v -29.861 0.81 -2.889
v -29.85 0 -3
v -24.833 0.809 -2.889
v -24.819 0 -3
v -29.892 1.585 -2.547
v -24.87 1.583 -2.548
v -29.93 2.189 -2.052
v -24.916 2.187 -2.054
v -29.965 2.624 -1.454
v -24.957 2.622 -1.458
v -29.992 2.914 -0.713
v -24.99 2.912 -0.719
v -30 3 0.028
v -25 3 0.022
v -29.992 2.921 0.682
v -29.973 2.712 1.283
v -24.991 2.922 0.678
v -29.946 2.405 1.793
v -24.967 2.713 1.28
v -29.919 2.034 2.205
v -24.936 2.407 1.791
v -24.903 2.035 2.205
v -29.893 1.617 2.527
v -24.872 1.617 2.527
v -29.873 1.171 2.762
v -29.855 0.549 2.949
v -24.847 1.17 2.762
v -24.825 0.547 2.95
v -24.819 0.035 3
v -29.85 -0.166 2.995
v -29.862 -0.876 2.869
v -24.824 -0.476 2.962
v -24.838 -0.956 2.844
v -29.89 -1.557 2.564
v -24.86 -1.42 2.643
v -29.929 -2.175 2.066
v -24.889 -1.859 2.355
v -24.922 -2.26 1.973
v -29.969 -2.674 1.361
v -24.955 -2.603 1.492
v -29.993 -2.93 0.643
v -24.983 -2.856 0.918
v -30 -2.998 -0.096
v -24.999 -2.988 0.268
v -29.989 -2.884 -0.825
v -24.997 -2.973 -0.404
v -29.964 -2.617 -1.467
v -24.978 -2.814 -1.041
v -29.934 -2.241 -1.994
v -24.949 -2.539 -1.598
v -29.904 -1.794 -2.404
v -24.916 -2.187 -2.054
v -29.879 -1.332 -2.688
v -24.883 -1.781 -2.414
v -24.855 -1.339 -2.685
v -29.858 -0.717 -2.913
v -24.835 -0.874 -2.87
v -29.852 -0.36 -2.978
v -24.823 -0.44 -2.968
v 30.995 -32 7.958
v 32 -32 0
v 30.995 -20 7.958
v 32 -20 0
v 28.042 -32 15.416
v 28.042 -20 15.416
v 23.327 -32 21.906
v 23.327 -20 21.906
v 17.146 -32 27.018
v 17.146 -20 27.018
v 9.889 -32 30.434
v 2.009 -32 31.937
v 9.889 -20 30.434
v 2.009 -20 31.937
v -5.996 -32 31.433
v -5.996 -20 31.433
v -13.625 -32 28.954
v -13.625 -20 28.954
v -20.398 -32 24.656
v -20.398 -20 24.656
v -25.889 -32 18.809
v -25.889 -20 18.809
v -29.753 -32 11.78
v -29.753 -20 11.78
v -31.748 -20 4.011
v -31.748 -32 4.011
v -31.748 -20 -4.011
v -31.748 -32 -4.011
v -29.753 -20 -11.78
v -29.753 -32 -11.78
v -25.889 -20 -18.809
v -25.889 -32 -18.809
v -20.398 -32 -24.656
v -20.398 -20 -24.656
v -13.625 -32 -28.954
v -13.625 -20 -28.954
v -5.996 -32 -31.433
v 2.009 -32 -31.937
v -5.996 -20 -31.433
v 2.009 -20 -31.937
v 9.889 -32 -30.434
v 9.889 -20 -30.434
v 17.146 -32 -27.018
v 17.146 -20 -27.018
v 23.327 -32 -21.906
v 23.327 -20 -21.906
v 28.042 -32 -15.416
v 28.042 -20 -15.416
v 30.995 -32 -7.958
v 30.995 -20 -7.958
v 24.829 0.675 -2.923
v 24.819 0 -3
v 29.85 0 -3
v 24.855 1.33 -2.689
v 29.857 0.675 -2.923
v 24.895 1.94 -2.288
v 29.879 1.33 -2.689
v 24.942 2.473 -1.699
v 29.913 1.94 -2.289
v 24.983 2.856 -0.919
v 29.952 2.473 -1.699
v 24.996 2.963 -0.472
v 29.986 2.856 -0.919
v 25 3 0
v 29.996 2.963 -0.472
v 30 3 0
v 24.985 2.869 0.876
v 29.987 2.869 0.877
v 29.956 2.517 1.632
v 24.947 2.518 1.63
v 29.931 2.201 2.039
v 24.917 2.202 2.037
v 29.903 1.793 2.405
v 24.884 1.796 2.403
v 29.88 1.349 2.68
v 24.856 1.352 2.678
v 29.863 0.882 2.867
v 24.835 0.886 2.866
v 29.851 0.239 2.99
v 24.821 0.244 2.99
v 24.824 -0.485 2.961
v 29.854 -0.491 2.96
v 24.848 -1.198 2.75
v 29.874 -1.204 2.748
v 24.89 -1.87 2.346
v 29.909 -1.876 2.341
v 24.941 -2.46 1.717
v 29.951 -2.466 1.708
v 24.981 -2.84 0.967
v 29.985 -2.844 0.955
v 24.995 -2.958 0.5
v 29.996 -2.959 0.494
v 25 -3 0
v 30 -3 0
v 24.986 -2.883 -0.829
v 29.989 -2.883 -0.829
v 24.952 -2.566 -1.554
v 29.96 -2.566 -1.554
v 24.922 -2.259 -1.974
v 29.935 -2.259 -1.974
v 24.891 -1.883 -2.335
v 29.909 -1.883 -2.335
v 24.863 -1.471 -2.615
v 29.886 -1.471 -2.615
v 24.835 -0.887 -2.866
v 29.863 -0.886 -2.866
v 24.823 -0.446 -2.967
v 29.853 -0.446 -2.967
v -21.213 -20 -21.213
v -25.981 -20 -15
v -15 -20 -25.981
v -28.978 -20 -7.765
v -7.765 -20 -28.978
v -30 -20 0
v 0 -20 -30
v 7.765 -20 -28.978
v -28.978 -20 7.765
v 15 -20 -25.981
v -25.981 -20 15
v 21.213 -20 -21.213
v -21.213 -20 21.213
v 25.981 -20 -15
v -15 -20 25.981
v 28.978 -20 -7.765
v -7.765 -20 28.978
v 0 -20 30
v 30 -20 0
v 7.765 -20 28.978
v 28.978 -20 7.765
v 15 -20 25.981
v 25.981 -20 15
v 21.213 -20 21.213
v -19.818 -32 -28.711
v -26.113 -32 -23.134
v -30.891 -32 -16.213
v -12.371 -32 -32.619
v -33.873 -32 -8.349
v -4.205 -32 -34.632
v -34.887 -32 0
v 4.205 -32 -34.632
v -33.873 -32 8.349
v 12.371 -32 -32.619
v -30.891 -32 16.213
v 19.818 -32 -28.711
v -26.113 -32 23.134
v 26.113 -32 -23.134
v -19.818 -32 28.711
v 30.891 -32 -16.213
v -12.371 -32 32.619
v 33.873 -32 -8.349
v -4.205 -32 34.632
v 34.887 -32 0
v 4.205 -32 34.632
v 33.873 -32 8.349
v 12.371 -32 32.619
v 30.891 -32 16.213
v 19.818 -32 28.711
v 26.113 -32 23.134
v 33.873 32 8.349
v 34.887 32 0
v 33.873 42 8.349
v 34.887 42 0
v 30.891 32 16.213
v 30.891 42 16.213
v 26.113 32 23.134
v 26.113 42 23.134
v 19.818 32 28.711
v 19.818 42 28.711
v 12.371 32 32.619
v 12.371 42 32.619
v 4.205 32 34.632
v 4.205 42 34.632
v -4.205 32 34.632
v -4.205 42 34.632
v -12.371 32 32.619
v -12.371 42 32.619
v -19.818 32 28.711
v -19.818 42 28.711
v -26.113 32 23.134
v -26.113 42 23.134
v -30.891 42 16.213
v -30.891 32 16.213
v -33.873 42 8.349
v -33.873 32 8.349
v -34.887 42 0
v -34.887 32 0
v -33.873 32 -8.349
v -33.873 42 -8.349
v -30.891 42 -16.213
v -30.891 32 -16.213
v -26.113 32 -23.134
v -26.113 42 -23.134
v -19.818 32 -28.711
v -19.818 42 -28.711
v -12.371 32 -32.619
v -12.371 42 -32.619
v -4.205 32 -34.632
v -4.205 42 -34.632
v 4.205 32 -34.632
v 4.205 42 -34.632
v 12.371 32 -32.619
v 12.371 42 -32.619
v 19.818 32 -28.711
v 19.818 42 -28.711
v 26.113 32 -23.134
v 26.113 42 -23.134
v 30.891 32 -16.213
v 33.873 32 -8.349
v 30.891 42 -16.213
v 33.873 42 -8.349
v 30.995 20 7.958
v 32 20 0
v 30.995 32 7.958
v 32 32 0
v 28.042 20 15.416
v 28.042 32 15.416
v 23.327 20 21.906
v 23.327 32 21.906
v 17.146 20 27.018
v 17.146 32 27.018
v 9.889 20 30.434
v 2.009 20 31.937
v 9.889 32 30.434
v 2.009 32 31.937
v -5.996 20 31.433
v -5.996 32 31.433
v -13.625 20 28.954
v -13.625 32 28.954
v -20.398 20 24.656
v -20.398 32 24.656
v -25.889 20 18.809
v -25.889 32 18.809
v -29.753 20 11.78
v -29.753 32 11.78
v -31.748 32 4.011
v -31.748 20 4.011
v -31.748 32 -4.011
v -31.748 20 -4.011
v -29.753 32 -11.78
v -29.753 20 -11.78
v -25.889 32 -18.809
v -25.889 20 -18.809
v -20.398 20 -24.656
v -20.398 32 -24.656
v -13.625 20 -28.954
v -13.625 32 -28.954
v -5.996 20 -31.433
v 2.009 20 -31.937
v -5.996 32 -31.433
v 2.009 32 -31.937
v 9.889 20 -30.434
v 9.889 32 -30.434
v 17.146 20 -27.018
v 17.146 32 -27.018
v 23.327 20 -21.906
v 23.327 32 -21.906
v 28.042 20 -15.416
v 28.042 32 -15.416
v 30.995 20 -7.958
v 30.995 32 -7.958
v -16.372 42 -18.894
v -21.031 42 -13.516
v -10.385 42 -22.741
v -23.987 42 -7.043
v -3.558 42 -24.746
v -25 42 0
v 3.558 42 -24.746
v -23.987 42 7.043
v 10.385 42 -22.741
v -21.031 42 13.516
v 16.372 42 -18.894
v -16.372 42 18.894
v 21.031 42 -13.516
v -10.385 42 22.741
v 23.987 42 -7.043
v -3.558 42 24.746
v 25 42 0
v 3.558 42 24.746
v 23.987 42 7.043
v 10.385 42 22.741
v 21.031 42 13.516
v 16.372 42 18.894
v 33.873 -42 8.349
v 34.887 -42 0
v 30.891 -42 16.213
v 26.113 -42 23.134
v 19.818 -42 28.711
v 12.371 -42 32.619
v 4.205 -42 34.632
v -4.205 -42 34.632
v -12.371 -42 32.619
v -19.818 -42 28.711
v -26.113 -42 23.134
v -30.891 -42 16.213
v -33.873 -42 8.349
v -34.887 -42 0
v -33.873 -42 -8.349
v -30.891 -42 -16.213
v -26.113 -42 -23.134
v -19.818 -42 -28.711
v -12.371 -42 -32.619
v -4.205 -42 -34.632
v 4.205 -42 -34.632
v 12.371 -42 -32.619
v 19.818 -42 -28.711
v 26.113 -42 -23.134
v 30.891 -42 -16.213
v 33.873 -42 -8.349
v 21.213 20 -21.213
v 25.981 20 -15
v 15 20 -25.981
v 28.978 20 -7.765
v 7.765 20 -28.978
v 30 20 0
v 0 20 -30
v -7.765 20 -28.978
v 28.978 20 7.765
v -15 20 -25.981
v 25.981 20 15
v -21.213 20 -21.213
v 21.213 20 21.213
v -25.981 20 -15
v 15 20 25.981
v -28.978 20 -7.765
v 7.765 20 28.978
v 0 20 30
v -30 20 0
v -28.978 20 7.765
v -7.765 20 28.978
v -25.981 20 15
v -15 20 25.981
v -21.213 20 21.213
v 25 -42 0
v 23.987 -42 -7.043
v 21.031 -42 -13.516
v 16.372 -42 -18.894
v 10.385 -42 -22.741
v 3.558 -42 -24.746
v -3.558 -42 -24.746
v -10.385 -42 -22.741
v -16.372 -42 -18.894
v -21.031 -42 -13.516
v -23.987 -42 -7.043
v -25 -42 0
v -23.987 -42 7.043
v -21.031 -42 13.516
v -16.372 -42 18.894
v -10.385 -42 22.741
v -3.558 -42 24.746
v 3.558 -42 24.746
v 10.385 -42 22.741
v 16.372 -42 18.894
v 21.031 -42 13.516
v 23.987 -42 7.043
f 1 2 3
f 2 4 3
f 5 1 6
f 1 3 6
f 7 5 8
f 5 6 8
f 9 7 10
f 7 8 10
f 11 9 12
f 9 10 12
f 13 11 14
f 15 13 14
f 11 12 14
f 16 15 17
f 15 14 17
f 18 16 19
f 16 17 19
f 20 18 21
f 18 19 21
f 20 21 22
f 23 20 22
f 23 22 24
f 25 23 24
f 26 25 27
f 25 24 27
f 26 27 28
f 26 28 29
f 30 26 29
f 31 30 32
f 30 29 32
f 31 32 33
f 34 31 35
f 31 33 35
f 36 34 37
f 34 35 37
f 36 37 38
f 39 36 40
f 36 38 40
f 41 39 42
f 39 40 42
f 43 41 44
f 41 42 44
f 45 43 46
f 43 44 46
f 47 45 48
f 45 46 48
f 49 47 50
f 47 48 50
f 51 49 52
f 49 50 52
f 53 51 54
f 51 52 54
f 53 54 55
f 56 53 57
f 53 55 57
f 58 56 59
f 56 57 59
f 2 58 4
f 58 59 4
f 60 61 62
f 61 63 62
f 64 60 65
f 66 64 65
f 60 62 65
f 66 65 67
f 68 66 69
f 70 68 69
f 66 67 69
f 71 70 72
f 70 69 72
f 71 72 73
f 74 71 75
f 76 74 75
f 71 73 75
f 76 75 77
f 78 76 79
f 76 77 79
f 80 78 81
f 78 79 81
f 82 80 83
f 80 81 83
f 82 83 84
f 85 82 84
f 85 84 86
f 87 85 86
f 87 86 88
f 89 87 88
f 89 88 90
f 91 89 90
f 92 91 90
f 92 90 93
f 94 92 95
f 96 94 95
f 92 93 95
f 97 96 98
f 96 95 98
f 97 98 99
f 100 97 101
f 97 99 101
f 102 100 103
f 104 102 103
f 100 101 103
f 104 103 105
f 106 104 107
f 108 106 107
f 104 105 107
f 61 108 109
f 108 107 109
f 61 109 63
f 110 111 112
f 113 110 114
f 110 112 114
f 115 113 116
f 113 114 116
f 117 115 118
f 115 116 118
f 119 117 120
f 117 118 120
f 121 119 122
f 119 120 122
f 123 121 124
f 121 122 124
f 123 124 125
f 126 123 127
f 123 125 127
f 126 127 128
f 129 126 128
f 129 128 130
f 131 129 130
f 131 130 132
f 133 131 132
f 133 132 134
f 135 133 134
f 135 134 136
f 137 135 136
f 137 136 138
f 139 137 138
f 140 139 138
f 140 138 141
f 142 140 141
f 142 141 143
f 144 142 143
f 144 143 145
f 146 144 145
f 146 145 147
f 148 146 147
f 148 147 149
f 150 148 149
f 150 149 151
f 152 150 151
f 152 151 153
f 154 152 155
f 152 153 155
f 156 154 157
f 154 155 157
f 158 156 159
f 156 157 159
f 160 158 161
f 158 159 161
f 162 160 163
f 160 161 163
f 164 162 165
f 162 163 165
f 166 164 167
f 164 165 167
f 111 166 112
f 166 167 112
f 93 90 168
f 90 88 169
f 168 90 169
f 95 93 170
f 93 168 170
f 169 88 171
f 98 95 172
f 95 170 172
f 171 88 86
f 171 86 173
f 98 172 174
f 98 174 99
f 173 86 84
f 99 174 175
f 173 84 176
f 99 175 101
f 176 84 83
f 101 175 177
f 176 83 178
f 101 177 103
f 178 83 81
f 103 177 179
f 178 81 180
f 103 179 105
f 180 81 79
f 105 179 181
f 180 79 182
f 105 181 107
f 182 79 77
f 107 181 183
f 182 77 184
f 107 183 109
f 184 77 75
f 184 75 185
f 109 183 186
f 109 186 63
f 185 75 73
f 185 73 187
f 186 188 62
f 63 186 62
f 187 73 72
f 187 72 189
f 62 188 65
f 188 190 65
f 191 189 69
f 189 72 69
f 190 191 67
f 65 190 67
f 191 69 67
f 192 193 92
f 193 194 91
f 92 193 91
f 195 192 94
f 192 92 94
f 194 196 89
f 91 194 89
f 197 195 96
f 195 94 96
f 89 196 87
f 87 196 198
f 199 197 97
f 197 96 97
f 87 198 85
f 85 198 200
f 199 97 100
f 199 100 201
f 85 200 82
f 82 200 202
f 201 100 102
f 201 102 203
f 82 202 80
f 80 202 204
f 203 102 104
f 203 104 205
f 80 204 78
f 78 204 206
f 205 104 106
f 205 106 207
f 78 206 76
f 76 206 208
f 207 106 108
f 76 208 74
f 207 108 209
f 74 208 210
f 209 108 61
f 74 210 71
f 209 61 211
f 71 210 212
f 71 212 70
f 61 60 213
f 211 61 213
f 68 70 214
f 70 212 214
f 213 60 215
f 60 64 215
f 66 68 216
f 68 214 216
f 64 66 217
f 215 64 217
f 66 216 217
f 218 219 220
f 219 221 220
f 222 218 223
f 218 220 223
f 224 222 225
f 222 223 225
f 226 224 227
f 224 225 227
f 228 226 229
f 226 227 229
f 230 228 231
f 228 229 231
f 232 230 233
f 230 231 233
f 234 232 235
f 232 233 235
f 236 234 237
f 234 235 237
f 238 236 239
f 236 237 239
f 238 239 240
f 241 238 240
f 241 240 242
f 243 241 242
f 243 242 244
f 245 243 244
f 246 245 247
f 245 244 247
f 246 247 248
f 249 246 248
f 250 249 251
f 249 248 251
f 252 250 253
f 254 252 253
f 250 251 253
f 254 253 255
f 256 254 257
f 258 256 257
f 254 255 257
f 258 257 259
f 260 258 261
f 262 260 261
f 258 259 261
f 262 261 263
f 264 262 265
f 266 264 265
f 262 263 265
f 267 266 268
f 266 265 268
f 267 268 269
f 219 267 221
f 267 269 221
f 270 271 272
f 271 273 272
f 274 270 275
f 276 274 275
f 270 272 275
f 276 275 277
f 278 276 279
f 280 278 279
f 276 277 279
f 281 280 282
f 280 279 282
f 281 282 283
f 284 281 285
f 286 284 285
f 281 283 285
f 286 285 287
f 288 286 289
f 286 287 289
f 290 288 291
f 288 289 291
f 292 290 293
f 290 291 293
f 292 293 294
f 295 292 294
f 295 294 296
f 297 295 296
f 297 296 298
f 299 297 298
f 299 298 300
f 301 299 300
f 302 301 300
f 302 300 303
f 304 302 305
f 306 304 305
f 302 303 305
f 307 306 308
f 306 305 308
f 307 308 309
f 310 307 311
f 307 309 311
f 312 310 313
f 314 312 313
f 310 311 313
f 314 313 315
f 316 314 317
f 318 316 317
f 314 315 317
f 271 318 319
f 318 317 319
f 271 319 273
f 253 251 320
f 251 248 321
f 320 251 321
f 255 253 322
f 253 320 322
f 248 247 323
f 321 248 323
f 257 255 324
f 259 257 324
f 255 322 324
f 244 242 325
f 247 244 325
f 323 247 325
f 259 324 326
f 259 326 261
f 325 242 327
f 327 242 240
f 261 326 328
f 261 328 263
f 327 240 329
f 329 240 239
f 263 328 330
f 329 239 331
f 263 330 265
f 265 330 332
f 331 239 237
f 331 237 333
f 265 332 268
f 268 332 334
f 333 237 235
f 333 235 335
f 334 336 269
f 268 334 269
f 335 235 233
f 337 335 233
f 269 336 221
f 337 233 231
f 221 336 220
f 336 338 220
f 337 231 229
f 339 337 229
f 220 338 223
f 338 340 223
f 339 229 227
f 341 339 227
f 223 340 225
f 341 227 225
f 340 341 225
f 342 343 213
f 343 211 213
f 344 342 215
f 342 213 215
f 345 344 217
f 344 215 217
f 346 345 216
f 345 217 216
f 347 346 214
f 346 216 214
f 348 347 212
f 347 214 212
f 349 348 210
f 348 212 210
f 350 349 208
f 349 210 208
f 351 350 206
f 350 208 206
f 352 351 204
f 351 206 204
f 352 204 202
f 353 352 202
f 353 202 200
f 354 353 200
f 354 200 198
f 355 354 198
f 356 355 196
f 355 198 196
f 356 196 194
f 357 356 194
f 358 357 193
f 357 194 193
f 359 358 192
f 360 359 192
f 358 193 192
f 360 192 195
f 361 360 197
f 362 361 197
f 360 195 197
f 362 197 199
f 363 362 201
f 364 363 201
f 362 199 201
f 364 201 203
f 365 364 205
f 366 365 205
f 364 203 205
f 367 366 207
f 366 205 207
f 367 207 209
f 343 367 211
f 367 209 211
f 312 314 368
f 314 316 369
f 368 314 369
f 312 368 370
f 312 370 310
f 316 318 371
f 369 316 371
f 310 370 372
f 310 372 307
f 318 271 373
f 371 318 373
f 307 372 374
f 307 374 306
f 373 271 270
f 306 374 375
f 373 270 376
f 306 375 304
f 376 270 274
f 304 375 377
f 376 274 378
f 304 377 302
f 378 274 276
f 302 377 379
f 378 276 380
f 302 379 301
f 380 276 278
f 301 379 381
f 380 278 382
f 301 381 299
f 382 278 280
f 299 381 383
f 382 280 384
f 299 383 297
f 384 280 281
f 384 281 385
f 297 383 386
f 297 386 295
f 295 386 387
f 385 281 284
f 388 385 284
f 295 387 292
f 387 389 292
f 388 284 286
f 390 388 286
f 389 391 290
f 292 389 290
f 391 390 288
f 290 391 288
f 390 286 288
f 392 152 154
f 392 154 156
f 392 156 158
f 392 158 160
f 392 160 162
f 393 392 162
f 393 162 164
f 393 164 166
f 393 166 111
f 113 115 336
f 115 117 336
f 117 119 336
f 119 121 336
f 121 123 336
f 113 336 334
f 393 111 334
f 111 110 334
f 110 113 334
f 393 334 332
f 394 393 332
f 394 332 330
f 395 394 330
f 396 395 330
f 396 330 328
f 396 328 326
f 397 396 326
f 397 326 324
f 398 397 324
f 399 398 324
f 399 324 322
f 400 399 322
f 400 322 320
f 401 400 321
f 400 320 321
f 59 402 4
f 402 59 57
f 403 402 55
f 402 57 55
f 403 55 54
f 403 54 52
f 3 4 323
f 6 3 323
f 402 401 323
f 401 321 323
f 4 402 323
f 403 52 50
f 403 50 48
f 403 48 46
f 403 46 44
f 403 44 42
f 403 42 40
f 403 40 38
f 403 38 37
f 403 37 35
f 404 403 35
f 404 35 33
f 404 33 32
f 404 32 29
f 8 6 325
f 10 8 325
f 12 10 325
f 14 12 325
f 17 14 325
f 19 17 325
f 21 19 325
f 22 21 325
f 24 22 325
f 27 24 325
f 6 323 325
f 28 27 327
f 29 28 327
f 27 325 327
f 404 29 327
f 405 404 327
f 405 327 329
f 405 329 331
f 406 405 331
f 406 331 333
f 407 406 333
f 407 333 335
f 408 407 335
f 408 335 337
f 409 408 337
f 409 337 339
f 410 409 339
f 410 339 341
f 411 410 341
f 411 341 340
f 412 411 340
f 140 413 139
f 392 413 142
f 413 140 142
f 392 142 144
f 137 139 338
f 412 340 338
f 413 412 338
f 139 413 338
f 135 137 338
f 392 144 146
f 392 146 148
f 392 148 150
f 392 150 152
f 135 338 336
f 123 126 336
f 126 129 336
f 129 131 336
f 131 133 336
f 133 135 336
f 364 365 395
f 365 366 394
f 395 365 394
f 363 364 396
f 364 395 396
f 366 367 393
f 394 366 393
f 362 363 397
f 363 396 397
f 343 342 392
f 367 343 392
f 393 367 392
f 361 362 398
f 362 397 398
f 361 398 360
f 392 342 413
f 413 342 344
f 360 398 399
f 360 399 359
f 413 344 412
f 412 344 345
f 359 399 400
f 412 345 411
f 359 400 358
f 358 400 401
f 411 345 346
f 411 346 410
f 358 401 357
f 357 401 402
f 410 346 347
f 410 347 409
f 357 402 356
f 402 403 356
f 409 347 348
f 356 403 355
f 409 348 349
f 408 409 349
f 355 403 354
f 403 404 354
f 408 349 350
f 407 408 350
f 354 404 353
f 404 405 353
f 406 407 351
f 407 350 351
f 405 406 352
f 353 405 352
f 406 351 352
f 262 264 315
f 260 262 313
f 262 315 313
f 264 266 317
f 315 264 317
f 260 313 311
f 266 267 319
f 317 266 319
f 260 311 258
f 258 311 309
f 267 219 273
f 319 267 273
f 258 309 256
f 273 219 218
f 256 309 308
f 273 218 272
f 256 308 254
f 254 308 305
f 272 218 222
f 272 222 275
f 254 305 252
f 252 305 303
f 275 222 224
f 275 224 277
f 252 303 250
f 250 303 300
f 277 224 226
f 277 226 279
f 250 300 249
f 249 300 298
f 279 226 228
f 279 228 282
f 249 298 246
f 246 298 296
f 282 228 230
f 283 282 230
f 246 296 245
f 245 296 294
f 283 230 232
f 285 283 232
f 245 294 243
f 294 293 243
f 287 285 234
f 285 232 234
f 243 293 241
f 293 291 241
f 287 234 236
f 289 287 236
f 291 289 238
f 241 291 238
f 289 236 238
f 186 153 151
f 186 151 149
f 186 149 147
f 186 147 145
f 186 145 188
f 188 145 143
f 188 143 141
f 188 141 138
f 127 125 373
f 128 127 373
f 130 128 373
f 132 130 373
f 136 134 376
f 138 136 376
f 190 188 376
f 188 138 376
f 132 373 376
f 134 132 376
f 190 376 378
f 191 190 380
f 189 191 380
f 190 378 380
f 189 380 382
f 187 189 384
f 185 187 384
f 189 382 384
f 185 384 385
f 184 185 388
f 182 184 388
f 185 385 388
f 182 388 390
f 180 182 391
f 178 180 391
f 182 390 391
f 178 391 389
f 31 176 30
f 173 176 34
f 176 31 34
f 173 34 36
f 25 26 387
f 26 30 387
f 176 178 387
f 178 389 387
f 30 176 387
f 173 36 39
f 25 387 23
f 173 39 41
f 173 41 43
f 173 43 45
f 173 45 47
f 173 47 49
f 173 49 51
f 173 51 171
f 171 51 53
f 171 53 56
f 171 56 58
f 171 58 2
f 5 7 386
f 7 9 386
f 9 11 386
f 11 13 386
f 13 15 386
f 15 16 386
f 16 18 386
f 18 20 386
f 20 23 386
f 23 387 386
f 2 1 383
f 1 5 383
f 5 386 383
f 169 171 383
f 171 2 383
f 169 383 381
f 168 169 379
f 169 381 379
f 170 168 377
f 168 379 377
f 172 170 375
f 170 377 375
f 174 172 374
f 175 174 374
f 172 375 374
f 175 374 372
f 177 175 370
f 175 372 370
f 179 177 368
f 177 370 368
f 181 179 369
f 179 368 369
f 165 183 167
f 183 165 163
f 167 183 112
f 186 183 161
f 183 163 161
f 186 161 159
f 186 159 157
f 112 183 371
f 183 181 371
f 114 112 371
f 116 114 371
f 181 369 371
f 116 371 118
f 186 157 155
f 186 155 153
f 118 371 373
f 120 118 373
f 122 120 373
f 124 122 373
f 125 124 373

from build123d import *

# Parameters (mm, degrees)
SKETCH4_R          = 25
CUT_EXTRUDE1_DEPTH = 106
SKETCH5_R          = 3
CUT_EXTRUDE2_DEPTH = 35


with BuildPart() as part:
    # Sketch2 → Revolve2 (revolve)
    with BuildSketch(Plane.XY):
        Polygon((0, 42), (0, -42), (34.886559364, -42), (34.886559364, -32), (32, -32), (32, -20), (30, -20), (30, 20), (32, 20), (32, 32), (34.886559364, 32), (34.886559364, 42), align=None)
    revolve(axis=Axis((0, 42, 0), (0, -1, 0)))

    # Sketch4 → Cut-Extrude1 (cut)
    with BuildSketch(Plane(origin=(0, 42, 0), x_dir=(1, 0, 0), z_dir=(0, 1, 0))):
        Circle(SKETCH4_R)
    extrude(amount=-CUT_EXTRUDE1_DEPTH, mode=Mode.SUBTRACT)

    # Sketch5 → Cut-Extrude2 (cut, symmetric)
    with BuildSketch(Plane(origin=(0, 0, 0), x_dir=(0, 0, -1), z_dir=(1, 0, 0))):
        Circle(SKETCH5_R)
    extrude(amount=CUT_EXTRUDE2_DEPTH, both=True, mode=Mode.SUBTRACT)


solid = part.part
